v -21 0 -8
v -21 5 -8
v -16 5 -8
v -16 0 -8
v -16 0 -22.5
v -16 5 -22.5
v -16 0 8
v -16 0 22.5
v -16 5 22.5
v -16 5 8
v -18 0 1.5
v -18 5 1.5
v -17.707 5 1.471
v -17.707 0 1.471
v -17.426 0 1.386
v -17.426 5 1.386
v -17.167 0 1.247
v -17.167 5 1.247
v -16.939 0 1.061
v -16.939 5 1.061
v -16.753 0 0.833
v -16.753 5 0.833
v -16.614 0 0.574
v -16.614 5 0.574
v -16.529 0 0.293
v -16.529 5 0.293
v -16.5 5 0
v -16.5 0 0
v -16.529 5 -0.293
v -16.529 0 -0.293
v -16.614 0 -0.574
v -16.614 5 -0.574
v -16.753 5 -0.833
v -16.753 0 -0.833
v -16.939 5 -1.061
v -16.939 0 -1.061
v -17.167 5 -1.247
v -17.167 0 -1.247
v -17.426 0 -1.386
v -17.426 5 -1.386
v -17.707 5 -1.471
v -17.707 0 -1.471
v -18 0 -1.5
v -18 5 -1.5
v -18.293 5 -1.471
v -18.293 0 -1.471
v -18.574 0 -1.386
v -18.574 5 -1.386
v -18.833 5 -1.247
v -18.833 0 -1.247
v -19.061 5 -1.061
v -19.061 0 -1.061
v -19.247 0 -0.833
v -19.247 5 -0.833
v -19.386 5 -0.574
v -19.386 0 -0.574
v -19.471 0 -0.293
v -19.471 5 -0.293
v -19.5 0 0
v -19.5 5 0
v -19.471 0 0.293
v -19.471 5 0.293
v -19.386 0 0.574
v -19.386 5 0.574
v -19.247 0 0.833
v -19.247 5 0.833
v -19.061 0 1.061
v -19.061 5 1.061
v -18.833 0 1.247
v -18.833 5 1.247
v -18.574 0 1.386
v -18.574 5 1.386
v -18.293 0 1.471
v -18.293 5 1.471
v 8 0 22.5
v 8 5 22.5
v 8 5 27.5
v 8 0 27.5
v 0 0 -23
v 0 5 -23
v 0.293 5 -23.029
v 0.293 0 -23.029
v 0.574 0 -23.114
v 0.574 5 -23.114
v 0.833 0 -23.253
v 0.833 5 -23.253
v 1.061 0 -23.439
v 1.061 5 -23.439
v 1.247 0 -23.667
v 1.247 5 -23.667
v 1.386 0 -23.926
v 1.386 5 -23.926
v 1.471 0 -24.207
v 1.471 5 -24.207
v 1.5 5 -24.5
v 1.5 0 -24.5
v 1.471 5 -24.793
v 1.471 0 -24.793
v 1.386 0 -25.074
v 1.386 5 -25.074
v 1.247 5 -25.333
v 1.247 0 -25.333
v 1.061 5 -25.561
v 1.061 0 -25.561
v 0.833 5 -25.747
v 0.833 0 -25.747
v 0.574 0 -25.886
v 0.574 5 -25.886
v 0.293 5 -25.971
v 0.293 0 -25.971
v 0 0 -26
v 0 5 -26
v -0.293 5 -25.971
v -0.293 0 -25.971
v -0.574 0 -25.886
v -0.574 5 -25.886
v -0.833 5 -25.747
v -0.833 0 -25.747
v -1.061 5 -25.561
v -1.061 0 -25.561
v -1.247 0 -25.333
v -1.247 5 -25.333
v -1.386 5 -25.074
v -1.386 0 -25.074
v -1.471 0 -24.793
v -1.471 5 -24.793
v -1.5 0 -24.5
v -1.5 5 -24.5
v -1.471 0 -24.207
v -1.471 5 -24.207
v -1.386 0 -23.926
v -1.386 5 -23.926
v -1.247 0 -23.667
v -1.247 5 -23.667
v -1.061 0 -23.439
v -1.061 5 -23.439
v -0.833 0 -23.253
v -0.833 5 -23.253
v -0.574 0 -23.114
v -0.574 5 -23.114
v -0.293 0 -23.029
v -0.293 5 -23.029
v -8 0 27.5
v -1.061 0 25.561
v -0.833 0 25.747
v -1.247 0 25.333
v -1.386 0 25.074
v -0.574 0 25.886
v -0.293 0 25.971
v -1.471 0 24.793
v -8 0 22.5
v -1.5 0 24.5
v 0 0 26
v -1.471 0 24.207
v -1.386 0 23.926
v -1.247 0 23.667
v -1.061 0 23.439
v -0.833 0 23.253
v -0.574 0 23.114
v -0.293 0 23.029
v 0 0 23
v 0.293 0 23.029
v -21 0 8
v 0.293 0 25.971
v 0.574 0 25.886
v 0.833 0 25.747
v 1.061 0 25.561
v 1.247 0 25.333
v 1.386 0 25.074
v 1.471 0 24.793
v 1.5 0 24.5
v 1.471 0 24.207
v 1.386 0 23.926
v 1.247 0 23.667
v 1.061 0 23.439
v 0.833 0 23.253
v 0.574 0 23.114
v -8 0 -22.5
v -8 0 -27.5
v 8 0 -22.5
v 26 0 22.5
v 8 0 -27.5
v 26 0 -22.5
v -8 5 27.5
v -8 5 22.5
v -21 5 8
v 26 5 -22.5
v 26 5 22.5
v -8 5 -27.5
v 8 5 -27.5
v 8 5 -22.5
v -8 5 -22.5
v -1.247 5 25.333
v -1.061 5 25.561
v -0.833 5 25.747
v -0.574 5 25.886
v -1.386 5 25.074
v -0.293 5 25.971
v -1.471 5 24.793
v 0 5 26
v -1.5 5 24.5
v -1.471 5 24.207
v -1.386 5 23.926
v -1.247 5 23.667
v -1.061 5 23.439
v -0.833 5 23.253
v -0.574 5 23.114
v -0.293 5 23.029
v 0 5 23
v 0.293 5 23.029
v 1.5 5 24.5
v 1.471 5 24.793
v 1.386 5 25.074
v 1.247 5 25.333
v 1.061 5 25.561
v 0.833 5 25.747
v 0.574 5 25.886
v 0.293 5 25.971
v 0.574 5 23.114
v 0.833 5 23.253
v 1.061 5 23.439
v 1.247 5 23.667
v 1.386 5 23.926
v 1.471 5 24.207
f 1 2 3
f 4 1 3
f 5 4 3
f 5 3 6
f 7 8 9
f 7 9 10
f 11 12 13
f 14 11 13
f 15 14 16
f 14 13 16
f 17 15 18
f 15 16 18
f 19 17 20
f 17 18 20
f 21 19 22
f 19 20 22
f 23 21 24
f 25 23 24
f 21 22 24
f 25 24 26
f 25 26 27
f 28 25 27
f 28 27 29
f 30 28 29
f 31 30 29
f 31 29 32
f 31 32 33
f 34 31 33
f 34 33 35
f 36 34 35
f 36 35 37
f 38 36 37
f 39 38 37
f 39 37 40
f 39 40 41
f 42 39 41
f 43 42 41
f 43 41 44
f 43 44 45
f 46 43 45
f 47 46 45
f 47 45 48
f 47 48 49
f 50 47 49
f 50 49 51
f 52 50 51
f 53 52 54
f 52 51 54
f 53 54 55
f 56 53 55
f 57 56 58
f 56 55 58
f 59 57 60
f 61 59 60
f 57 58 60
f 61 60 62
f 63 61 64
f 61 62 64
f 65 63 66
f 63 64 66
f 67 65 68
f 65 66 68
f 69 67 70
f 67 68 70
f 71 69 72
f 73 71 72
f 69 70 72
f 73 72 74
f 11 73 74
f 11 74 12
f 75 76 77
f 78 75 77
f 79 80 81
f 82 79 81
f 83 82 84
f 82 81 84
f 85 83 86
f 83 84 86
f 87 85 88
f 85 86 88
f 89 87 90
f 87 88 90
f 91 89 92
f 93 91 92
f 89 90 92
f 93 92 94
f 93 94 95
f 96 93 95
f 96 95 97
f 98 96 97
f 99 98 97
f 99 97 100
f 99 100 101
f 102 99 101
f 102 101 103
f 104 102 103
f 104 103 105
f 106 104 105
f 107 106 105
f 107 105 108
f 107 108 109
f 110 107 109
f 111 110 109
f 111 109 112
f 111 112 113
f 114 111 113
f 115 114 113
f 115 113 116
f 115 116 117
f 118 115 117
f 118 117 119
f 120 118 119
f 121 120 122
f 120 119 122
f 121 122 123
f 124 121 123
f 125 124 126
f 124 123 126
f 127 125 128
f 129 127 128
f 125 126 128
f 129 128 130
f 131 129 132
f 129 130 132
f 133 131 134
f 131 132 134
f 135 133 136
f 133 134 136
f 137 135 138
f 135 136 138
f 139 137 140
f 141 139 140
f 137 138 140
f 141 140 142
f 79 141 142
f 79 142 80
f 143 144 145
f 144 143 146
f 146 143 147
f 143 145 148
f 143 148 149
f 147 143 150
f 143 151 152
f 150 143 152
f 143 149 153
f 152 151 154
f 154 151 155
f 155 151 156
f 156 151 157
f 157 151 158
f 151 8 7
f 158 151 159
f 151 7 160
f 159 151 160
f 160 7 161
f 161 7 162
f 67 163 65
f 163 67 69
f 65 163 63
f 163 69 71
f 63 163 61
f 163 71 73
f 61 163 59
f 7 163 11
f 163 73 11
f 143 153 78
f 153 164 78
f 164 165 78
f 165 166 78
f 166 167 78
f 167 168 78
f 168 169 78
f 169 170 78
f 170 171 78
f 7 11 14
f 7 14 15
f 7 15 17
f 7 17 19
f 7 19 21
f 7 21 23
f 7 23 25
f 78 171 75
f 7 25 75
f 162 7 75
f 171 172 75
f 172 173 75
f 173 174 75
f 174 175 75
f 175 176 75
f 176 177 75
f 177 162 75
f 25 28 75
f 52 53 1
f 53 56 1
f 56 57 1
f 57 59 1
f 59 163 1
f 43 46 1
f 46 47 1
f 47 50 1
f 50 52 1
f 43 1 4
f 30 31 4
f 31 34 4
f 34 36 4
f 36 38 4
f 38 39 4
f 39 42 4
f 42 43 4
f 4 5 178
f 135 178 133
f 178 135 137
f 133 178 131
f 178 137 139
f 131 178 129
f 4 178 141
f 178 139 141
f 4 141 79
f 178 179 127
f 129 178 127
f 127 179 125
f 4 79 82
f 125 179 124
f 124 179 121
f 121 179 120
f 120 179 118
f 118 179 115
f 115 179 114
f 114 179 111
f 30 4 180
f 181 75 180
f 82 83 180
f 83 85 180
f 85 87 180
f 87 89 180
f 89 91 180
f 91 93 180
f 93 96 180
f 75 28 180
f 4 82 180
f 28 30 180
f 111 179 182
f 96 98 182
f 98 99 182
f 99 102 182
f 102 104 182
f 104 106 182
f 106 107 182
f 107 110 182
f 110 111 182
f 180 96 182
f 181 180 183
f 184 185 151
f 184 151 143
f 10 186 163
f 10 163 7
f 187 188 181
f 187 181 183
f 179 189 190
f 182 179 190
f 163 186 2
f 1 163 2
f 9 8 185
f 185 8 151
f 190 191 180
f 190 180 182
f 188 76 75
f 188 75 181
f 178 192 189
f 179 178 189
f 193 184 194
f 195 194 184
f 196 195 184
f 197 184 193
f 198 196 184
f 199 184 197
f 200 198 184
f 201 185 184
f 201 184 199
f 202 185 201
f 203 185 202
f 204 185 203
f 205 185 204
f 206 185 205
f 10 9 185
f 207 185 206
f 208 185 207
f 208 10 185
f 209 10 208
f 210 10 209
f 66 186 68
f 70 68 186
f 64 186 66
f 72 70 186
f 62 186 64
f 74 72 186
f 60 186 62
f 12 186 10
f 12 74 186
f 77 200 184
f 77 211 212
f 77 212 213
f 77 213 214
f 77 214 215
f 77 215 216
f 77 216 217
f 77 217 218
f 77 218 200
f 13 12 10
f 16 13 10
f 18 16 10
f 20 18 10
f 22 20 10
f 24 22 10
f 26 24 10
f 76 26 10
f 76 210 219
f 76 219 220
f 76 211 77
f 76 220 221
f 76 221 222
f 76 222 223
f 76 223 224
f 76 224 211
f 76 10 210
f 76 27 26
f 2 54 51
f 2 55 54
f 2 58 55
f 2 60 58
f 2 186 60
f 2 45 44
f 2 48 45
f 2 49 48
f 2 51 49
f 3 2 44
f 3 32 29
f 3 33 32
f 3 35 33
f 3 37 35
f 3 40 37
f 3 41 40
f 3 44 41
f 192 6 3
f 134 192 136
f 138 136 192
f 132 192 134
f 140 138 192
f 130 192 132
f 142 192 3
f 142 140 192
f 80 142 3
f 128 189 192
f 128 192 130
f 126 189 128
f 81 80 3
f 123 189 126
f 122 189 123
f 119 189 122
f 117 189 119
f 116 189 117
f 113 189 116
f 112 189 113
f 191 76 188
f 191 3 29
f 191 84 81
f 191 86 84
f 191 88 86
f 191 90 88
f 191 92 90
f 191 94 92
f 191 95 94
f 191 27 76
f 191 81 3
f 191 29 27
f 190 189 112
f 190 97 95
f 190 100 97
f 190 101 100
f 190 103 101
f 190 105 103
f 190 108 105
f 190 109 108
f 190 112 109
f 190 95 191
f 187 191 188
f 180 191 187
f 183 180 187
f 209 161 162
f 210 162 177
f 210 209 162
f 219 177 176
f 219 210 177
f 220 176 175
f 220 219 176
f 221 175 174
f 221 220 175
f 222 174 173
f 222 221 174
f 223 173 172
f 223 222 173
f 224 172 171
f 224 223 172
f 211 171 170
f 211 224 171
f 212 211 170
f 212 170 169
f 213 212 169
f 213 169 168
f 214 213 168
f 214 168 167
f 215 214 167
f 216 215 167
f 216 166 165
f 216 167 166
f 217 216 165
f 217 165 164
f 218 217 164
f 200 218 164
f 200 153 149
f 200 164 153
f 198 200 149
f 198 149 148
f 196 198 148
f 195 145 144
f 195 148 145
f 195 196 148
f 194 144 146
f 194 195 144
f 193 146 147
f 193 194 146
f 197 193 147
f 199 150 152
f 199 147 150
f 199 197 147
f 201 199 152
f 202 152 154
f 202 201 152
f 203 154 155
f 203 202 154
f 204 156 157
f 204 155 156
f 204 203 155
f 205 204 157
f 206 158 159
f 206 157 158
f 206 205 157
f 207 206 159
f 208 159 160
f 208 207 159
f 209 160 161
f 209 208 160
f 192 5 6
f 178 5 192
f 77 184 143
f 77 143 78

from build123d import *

# Parameters (mm, degrees)
CROQUIS1_W              = 32
CROQUIS1_H              = 45
SALIENTE_EXTRUIR1_DEPTH = 5
CROQUIS2_W              = 16
CROQUIS2_H              = 10
SALIENTE_EXTRUIR2_DEPTH = 5
CROQUIS3_R              = 1.5
CORTAR_EXTRUIR1_DEPTH   = 33.20636583
CROQUIS4_W              = 10
CROQUIS4_H              = 16
SALIENTE_EXTRUIR3_DEPTH = 5
CROQUIS5_R              = 1.5
CORTAR_EXTRUIR2_DEPTH   = 35.960692213
CROQUIS6_W              = 10
CROQUIS6_H              = 45
SALIENTE_EXTRUIR4_DEPTH = 5


with BuildPart() as part:
    # Croquis1 → Saliente-Extruir1 (new body)
    with BuildSketch(Plane(origin=(0, 0, 0), x_dir=(1, 0, 0), z_dir=(0, 1, 0))):
        Rectangle(CROQUIS1_W, CROQUIS1_H)
    extrude(amount=SALIENTE_EXTRUIR1_DEPTH)

    # Croquis2 → Saliente-Extruir2 (add, through all)
    with BuildSketch(Plane(origin=(0, 5, 0), x_dir=(1, 0, 0), z_dir=(0, 1, 0))):
        with Locations((0, 22.5)):
            Rectangle(CROQUIS2_W, CROQUIS2_H)
    saliente_extruir2 = extrude(amount=-SALIENTE_EXTRUIR2_DEPTH)

    # Croquis3 → Cortar-Extruir1 (cut, through all)
    with BuildSketch(Plane(origin=(0, 5, 0), x_dir=(1, 0, 0), z_dir=(0, 1, 0))):
        with Locations(Location((0, 24.5, 0), (0, 0, 270))):
            Circle(CROQUIS3_R)
    cortar_extruir1 = extrude(amount=-CORTAR_EXTRUIR1_DEPTH, mode=Mode.SUBTRACT)

    # Simetría1: Saliente-Extruir2, Cortar-Extruir1 across plane
    add(saliente_extruir2.mirror(Plane.XY))
    add(cortar_extruir1.mirror(Plane.XY), mode=Mode.SUBTRACT)

    # Croquis4 → Saliente-Extruir3 (add, through all)
    with BuildSketch(Plane(origin=(0, 5, 0), x_dir=(1, 0, 0), z_dir=(0, 1, 0))):
        with Locations((-16, 0)):
            Rectangle(CROQUIS4_W, CROQUIS4_H)
    extrude(amount=-SALIENTE_EXTRUIR3_DEPTH)

    # Croquis5 → Cortar-Extruir2 (cut, through all)
    with BuildSketch(Plane(origin=(0, 5, 0), x_dir=(1, 0, 0), z_dir=(0, 1, 0))):
        with Locations(Location((-18, 0, 0), (0, 0, 270))):
            Circle(CROQUIS5_R)
    extrude(amount=-CORTAR_EXTRUIR2_DEPTH, mode=Mode.SUBTRACT)

    # Croquis6 → Saliente-Extruir4 (add)
    with BuildSketch(Plane(origin=(0, 5, 0), x_dir=(1, 0, 0), z_dir=(0, 1, 0))):
        with Locations((21, 0)):
            Rectangle(CROQUIS6_W, CROQUIS6_H)
    extrude(amount=-SALIENTE_EXTRUIR4_DEPTH)


solid = part.part
